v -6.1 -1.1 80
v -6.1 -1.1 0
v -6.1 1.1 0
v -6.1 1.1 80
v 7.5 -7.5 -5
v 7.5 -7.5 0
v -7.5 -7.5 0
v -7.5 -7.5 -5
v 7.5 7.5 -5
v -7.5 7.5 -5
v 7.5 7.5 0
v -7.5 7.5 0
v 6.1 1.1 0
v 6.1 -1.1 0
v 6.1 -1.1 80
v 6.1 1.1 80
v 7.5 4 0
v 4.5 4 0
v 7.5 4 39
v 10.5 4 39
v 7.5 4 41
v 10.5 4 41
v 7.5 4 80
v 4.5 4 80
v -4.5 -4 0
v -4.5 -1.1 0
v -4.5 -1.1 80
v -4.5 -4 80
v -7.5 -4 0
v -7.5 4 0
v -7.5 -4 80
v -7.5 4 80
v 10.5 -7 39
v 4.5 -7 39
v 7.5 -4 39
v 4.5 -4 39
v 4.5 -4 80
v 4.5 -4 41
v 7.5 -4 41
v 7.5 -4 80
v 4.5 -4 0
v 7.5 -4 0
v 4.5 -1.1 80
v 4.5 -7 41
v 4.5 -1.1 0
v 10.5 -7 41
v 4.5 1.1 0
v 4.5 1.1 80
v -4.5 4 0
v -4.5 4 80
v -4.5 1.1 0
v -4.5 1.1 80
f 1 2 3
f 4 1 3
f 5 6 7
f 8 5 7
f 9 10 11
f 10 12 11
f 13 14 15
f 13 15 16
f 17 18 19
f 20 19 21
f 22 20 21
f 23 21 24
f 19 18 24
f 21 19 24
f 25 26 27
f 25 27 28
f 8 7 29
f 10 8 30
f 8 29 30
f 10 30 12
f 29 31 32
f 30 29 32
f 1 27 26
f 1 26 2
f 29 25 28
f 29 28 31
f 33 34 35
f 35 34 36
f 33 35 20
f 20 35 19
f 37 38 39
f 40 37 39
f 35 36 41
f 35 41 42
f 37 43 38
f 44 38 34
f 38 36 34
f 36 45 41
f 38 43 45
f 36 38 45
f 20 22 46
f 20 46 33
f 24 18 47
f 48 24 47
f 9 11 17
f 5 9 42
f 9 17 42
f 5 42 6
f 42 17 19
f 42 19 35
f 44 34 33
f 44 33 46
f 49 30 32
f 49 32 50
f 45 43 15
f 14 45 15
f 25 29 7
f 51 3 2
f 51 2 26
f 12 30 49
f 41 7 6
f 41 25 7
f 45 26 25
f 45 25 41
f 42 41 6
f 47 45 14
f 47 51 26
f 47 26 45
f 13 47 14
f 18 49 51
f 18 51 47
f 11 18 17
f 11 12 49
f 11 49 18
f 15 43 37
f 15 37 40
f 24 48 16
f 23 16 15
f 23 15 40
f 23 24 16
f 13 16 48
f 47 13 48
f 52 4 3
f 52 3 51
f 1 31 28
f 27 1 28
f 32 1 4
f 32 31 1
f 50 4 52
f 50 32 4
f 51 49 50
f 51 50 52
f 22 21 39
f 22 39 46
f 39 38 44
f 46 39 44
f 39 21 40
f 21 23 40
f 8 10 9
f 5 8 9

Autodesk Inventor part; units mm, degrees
ref_plane "YZ Plane" through (0, 0, 0) normal (1, 0, 0) x (0, 1, 0)
ref_plane "XZ Plane" through (0, 0, 0) normal (0, 1, 0) x (-1, 0, 0)
ref_plane "XY Plane" through (0, 0, 0) normal (0, 0, 1) x (1, 0, 0)
sketch "Sketch1" plane through (0, 0, 0) normal (0, 0, 1) x (1, 0, 0)
  line L0 (-7.5, 7.5) -> (7.5, 7.5)
  line L1 (7.5, 7.5) -> (7.5, -7.5)
  line L2 (7.5, -7.5) -> (-7.5, -7.5)
  line L3 (-7.5, -7.5) -> (-7.5, 7.5)
  line L4 (-7.5, 7.5) -> (7.5, -7.5) construction
  line L5 (7.5, 7.5) -> (-7.5, -7.5) construction
  line L6 (0, 4.0776) -> (0, -3.6051) construction
  line L7 (-7.5, 4) -> (-4.5, 4)
  line L8 (-4.5, -4) -> (-7.5, -4)
  line L9 (-7.5, -4) -> (-7.5, 4)
  line L10 (-7.5, 4) -> (-4.5, -4) construction
  line L11 (-4.5, 4) -> (-7.5, -4) construction
  line L12 (-6.1, 1.1) -> (-4.5, 1.1)
  line L13 (-2.9, 1.1) -> (-2.9, -1.1)
  line L14 (-4.5, -1.1) -> (-6.1, -1.1)
  line L15 (-6.1, -1.1) -> (-6.1, 1.1)
  line L16 (-6.1, 1.1) -> (-2.9, -1.1) construction
  line L17 (-2.9, 1.1) -> (-6.1, -1.1) construction
  line L18 (7.5, 7.5) -> (-7.5, -7.5) construction
  line L19 (-7.5, 7.5) -> (7.5, -7.5) construction
  line L20 (7.5, 4) -> (4.5, 4)
  line L21 (4.5, -4) -> (7.5, -4)
  line L22 (7.5, 4) -> (4.5, -4) construction
  line L23 (4.5, 4) -> (7.5, -4) construction
  line L24 (6.1, 1.1) -> (4.5, 1.1)
  line L25 (4.5, -1.1) -> (6.1, -1.1)
  line L26 (6.1, -1.1) -> (6.1, 1.1)
  line L27 (6.1, 1.1) -> (2.9, -1.1) construction
  line L28 (2.9, 1.1) -> (6.1, -1.1) construction
  line L29 (4.5, 4) -> (4.5, 1.1)
  line L30 (4.5, -1.1) -> (4.5, -4)
  line L31 (-4.5, 4) -> (-4.5, 1.1)
  line L32 (-4.5, -1.1) -> (-4.5, -4)
  point P0 (0, 0)
  point P1 (-6, 0)
  point P2 (-4.5, 0)
  point P3 (6, 0)
  point P4 (4.5, 0)
  dimension "d0" = 15
  dimension "d1" = 15
  dimension "d2" = 3
  dimension "d3" = 8
  dimension "d6" = 3.2
  dimension "d7" = 2.2
extrude "Extrusion1" add sketch "Sketch1" against normal blind 5
extrude "Extrusion2" add sketch "Sketch1" along normal blind 80 contours L7 L31 L12 L15 L14 L32 L8 L3 | L1 L21 L30 L25 L26 L24 L29 L20
sketch "Sketch2" plane through (4.5, -4, 0) normal (0, -1, 0) x (1, 0, 0)
  line L0 (3, 0) -> (3, 80) projected
  line L1 (-3, 41) -> (3, 41)
  line L2 (3, 41) -> (3, 39)
  line L3 (3, 39) -> (-3, 39)
  line L4 (-3, 39) -> (-3, 41)
  line L5 (0, 0) -> (0, 80) projected
  line L6 (-3, 41) -> (3, 39) construction
  line L7 (3, 41) -> (-3, 39) construction
  line L8 (0, 41) -> (0, 39)
  point P0 (-4.5, 0)
  point P1 (0, 40)
  point P2 (3, 41)
  dimension "d12" = 2
extrude "Extrusion3" add sketch "Sketch2" along normal blind 3 contours L3 L5 L1 L0
sketch "Sketch3" plane through (7.5, -7.5, -5) normal (1, 0, 0) x (0, 0, -1)
  line L0 (-44, 0.5) -> (-46, 0.5) projected
  line L1 (-5, 11.5) -> (-85, 11.5) projected
  line L2 (-46, 0.5) -> (-44, 0.5)
  line L3 (-44, 0.5) -> (-44, 11.5)
  line L4 (-44, 11.5) -> (-46, 11.5)
  line L5 (-46, 11.5) -> (-46, 0.5)
  point P0 (-5, 7.5)
  dimension "d15" = 2
extrude "Extrusion4" add sketch "Sketch3" along normal blind 3
properties part number "Bracket Lifter_3DPrint"
